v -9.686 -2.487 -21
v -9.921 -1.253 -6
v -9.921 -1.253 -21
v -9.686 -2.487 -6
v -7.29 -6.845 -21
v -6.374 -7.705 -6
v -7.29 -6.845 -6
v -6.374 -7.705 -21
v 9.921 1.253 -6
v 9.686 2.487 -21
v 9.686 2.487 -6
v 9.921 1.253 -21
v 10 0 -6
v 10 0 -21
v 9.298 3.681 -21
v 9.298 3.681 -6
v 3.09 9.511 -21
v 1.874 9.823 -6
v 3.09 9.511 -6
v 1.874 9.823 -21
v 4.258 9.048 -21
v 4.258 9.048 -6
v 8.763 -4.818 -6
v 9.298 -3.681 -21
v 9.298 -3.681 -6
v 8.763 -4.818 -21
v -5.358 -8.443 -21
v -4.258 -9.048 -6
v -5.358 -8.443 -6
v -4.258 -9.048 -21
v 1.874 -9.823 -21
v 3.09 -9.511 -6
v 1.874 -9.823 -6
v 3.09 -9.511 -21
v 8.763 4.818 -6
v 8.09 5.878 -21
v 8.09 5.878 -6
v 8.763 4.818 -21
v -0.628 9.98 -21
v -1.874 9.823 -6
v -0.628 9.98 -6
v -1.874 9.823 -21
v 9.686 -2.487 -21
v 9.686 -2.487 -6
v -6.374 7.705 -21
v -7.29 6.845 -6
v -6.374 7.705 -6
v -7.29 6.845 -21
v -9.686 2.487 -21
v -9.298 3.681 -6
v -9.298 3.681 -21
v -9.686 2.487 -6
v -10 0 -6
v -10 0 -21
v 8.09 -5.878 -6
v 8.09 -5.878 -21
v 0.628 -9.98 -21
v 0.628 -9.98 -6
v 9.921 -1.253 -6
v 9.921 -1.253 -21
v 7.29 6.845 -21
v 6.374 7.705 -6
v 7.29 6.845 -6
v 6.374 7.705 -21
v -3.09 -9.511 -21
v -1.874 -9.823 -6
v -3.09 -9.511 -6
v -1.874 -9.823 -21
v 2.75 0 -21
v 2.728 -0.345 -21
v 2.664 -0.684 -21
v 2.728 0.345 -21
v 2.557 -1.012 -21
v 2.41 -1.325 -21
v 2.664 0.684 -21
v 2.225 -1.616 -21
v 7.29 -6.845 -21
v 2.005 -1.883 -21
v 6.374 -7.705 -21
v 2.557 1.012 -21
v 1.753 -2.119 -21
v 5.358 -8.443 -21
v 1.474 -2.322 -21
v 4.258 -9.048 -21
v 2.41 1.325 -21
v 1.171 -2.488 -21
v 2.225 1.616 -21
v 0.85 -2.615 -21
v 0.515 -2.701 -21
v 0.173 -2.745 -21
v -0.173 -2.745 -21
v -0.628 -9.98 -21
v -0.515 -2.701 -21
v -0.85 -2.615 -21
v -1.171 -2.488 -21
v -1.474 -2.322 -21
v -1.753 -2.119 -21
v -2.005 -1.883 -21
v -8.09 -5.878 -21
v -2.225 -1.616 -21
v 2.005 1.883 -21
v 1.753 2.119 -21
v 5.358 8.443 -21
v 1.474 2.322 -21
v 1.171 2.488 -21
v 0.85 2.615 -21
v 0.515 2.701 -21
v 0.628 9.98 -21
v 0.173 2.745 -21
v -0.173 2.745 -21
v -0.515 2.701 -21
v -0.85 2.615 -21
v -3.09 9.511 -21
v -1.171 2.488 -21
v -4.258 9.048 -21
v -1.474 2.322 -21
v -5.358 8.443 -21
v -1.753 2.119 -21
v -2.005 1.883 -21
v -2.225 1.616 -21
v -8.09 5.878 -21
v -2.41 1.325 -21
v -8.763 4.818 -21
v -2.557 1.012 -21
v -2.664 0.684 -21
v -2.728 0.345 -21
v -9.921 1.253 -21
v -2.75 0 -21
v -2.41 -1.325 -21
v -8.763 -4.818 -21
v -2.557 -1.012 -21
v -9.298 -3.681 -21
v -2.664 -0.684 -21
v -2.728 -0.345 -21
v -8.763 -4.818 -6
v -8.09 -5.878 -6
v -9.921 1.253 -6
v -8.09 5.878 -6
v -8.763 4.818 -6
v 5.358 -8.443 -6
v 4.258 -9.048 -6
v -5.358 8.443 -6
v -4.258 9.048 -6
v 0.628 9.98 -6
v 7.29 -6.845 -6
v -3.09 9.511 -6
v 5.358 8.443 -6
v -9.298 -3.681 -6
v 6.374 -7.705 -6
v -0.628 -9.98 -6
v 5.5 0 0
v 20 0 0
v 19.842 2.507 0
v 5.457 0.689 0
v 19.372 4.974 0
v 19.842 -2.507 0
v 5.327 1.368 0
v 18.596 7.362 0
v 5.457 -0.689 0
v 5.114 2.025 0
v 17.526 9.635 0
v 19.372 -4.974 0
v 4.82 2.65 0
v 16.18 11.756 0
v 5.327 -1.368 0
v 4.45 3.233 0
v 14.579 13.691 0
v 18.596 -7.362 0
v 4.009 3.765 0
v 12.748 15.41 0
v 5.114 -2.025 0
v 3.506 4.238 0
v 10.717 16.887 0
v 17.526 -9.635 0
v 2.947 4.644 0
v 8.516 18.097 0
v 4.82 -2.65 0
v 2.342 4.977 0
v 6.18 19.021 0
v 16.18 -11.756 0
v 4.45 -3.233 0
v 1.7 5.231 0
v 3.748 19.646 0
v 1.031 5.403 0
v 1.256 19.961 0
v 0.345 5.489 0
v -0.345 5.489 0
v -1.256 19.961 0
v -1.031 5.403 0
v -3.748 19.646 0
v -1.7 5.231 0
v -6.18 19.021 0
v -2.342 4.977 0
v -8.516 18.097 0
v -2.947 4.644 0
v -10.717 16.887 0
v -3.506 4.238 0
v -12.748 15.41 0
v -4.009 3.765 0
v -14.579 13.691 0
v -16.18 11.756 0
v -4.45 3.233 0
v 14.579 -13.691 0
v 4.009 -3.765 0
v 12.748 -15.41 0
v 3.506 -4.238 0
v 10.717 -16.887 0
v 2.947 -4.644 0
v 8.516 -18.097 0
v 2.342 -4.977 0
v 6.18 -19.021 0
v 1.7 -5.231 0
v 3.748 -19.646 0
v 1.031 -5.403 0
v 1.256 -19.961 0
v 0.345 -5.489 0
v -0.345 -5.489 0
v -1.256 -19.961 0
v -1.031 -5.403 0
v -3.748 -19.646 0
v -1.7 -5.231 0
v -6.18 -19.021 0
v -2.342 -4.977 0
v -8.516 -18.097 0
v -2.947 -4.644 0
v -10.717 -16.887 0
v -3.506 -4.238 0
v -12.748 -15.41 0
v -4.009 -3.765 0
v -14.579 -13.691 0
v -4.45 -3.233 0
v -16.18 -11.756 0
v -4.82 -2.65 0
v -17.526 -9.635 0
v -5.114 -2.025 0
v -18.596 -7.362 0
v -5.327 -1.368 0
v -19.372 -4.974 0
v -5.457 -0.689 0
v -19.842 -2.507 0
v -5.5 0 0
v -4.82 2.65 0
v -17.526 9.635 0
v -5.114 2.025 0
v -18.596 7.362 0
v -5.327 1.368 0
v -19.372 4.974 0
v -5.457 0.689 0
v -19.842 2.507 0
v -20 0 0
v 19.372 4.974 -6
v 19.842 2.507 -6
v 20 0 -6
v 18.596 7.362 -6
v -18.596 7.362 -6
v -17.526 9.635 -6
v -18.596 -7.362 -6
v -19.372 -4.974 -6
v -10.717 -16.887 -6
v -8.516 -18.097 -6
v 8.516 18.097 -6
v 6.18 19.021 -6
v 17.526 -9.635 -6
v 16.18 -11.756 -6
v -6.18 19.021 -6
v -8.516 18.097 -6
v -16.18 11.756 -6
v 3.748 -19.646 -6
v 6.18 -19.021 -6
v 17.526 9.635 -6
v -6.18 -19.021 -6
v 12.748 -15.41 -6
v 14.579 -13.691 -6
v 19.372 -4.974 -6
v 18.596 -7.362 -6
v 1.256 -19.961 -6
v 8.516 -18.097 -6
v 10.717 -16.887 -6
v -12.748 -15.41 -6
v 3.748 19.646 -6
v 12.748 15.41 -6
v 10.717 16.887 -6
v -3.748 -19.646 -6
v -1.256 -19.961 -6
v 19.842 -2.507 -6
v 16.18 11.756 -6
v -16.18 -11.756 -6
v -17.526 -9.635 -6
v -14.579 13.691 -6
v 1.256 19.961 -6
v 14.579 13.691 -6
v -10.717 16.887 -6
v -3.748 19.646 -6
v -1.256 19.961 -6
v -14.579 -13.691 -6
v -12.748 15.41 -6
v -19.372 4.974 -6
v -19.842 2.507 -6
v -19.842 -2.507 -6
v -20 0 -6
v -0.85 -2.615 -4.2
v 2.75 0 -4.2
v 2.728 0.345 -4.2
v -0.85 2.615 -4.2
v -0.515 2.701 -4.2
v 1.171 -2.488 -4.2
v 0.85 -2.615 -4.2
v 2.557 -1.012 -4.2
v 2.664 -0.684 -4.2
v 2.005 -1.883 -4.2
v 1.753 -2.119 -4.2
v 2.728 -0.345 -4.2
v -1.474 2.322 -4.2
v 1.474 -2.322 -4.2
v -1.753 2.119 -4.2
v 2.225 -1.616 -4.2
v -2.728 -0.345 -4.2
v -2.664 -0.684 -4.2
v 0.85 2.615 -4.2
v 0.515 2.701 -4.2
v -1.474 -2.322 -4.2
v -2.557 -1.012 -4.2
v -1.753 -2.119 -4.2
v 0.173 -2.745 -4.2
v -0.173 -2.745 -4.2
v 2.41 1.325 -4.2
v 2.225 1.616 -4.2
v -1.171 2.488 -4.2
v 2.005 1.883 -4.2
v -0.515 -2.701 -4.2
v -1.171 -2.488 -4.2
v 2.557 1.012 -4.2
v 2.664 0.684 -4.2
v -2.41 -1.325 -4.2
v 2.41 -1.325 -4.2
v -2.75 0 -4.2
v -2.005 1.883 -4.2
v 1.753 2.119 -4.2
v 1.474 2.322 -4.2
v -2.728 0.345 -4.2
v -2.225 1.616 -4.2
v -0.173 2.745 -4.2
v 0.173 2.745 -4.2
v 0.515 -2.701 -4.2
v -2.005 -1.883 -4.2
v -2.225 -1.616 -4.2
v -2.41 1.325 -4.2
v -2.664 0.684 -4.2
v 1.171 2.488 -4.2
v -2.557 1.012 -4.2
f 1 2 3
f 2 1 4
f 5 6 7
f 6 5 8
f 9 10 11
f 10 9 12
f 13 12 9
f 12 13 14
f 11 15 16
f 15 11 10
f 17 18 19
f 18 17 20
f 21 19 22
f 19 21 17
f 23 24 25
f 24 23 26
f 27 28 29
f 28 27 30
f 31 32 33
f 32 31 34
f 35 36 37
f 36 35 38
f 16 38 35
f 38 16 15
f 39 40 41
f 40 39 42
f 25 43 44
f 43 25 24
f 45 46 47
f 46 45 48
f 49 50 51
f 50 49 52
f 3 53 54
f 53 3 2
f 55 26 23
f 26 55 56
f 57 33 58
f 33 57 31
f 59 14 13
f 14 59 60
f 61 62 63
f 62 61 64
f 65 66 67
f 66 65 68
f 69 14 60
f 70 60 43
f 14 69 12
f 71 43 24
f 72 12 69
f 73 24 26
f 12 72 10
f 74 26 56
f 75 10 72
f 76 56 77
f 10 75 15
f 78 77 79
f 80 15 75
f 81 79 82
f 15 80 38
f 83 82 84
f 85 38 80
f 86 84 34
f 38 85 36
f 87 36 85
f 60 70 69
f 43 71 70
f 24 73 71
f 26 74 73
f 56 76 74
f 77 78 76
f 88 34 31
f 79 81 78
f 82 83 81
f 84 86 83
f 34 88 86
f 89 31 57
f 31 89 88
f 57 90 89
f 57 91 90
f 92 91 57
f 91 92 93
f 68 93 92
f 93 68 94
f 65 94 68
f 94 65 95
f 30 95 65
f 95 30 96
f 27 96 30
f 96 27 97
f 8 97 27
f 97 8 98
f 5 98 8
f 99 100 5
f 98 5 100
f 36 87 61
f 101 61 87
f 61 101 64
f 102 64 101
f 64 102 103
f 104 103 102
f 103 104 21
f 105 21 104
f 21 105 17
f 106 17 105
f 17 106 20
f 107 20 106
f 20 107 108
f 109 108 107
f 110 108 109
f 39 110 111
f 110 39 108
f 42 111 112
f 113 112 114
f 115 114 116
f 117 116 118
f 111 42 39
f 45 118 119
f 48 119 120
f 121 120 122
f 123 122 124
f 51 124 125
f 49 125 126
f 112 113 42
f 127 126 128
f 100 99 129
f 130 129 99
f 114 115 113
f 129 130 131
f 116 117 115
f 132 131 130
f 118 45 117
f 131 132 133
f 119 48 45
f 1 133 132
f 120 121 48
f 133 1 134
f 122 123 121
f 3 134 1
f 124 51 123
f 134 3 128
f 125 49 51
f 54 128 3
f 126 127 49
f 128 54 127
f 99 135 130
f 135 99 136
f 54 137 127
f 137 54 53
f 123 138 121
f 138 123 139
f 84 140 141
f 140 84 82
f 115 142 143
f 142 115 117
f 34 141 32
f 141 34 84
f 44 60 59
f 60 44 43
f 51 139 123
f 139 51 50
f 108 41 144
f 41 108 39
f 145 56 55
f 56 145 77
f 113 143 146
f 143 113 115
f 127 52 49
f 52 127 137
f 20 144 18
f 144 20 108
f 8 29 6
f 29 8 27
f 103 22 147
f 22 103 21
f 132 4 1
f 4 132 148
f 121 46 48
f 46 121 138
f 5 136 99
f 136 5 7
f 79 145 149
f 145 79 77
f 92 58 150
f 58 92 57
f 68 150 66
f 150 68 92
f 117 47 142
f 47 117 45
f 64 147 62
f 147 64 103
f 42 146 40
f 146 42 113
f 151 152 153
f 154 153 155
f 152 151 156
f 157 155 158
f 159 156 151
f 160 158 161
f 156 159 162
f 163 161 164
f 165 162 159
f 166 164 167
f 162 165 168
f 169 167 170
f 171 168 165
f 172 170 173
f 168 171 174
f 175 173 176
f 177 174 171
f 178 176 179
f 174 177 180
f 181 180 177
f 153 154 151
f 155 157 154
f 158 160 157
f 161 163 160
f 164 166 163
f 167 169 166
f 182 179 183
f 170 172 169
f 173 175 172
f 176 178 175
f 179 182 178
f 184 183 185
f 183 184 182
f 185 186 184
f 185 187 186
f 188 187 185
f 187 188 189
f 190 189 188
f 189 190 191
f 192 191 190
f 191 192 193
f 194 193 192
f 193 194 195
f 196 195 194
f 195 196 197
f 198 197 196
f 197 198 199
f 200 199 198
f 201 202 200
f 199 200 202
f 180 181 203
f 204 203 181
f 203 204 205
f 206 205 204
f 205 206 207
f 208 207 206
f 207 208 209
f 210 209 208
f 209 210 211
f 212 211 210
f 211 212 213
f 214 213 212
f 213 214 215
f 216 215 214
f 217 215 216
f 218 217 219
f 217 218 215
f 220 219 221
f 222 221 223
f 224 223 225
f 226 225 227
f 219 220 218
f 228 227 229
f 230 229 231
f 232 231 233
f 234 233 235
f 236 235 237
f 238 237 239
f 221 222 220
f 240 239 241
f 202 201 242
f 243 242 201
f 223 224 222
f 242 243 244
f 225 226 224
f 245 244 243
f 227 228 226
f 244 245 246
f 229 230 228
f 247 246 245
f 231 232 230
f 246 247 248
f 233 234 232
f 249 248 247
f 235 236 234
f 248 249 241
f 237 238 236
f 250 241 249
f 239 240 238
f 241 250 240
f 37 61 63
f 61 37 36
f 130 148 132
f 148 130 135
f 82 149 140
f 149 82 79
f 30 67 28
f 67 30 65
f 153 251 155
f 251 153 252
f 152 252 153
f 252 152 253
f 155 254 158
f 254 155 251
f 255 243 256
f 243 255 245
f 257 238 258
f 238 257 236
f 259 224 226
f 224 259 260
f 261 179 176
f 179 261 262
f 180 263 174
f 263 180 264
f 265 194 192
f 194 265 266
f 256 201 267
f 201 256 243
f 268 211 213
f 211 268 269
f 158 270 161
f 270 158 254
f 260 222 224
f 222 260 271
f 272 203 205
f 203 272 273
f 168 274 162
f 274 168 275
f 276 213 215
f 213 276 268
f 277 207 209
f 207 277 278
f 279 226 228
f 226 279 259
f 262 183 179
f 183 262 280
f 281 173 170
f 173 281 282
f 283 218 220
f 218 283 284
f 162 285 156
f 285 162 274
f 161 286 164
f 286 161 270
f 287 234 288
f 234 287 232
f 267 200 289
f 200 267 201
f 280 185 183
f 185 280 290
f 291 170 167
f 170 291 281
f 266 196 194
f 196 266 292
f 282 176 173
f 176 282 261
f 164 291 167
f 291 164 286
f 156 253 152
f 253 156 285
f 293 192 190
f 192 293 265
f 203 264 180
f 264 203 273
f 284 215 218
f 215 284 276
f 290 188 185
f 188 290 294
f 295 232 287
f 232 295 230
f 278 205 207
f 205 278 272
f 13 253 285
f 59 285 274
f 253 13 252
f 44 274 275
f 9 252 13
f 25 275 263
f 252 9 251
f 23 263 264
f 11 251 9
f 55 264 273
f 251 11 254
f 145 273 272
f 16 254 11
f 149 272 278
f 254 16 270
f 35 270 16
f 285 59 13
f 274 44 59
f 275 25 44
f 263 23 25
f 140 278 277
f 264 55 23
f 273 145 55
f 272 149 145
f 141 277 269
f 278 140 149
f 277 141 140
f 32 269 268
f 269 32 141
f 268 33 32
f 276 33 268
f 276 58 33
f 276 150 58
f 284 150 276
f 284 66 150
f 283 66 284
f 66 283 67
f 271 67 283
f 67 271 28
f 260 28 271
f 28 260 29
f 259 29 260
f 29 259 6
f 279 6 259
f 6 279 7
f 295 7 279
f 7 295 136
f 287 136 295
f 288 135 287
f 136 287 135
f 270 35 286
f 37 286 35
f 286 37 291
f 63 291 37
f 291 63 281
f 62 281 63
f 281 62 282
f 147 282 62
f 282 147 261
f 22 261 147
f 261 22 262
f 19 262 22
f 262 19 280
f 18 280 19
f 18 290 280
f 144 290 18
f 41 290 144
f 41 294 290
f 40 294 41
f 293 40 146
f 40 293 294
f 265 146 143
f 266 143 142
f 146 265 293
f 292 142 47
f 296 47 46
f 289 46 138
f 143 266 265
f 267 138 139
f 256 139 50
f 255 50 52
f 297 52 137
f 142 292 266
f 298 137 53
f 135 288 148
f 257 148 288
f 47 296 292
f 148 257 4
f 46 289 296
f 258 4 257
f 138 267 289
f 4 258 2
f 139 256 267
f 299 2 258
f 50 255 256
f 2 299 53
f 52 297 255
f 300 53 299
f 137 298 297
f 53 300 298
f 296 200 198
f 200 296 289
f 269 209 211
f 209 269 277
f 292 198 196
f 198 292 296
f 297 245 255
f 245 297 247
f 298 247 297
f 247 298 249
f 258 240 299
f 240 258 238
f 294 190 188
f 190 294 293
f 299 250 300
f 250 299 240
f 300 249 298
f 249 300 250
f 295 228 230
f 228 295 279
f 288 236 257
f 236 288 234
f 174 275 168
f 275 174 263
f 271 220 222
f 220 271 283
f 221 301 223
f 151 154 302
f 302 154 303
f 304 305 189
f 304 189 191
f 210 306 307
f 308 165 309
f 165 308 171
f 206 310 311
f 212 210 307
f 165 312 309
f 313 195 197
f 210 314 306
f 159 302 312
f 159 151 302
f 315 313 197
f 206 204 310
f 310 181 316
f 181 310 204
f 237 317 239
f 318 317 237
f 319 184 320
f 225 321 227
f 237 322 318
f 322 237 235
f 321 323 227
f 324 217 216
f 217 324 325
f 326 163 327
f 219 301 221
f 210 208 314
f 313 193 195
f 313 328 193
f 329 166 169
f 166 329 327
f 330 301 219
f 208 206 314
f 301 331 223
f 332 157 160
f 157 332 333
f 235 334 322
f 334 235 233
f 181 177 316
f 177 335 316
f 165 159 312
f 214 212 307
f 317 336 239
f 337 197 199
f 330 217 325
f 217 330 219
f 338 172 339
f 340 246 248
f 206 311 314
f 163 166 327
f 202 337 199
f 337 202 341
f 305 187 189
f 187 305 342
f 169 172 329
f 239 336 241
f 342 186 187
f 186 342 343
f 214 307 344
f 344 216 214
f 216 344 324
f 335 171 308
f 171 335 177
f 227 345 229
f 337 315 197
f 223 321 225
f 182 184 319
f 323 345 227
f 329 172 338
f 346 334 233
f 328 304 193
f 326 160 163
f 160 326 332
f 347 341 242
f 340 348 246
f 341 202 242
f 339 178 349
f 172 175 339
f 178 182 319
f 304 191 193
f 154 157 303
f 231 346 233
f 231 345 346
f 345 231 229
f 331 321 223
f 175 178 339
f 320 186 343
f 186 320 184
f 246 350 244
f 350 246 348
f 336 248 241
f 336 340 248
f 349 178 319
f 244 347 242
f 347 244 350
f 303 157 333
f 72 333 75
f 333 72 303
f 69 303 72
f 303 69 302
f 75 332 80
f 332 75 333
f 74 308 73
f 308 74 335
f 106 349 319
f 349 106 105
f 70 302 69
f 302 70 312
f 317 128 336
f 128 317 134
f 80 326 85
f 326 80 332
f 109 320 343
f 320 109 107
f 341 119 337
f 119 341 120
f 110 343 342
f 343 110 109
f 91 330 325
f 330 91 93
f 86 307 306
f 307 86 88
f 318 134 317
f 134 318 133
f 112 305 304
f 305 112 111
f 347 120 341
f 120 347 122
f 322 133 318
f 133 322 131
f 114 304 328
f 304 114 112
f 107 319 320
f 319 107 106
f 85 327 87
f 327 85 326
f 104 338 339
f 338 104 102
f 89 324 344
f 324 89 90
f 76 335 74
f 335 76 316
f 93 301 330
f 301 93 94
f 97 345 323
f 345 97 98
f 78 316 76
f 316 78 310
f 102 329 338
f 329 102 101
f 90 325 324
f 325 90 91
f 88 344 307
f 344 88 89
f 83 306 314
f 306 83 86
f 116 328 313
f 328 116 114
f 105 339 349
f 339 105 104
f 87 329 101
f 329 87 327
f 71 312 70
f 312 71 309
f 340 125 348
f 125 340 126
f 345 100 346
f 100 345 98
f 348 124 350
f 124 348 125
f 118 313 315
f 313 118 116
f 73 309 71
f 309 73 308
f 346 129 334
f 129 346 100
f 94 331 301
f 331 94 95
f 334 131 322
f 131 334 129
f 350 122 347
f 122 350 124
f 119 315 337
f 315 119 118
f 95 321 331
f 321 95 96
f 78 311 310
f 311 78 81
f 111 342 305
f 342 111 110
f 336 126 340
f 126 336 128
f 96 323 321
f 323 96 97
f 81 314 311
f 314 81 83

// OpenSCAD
$fn = 50;


difference() {
	union() {
		translate(v = [0, 0, -21.0000000000]) {
			cylinder(h = 21, r = 10.0000000000);
		}
		translate(v = [0, 0, -6.0000000000]) {
			cylinder(h = 6, r = 20.0000000000);
		}
	}
	union() {
		translate(v = [0, 0, 0]) {
			rotate(a = [0, 0, 0]) {
				difference() {
					union() {
						#translate(v = [0, 0, -21.0000000000]) {
							cylinder(h = 21, r = 2.2500000000);
						}
						#translate(v = [0, 0, -4.2000000000]) {
							cylinder(h = 4.2000000000, r = 10.0000000000, r1 = 2.7500000000, r2 = 5.5000000000);
						}
						#translate(v = [0, 0, -21.0000000000]) {
							cylinder(h = 21, r = 2.7500000000);
						}
						#translate(v = [0, 0, -21.0000000000]) {
							cylinder(h = 21, r = 2.2500000000);
						}
					}
					union();
				}
			}
		}
	}
}
